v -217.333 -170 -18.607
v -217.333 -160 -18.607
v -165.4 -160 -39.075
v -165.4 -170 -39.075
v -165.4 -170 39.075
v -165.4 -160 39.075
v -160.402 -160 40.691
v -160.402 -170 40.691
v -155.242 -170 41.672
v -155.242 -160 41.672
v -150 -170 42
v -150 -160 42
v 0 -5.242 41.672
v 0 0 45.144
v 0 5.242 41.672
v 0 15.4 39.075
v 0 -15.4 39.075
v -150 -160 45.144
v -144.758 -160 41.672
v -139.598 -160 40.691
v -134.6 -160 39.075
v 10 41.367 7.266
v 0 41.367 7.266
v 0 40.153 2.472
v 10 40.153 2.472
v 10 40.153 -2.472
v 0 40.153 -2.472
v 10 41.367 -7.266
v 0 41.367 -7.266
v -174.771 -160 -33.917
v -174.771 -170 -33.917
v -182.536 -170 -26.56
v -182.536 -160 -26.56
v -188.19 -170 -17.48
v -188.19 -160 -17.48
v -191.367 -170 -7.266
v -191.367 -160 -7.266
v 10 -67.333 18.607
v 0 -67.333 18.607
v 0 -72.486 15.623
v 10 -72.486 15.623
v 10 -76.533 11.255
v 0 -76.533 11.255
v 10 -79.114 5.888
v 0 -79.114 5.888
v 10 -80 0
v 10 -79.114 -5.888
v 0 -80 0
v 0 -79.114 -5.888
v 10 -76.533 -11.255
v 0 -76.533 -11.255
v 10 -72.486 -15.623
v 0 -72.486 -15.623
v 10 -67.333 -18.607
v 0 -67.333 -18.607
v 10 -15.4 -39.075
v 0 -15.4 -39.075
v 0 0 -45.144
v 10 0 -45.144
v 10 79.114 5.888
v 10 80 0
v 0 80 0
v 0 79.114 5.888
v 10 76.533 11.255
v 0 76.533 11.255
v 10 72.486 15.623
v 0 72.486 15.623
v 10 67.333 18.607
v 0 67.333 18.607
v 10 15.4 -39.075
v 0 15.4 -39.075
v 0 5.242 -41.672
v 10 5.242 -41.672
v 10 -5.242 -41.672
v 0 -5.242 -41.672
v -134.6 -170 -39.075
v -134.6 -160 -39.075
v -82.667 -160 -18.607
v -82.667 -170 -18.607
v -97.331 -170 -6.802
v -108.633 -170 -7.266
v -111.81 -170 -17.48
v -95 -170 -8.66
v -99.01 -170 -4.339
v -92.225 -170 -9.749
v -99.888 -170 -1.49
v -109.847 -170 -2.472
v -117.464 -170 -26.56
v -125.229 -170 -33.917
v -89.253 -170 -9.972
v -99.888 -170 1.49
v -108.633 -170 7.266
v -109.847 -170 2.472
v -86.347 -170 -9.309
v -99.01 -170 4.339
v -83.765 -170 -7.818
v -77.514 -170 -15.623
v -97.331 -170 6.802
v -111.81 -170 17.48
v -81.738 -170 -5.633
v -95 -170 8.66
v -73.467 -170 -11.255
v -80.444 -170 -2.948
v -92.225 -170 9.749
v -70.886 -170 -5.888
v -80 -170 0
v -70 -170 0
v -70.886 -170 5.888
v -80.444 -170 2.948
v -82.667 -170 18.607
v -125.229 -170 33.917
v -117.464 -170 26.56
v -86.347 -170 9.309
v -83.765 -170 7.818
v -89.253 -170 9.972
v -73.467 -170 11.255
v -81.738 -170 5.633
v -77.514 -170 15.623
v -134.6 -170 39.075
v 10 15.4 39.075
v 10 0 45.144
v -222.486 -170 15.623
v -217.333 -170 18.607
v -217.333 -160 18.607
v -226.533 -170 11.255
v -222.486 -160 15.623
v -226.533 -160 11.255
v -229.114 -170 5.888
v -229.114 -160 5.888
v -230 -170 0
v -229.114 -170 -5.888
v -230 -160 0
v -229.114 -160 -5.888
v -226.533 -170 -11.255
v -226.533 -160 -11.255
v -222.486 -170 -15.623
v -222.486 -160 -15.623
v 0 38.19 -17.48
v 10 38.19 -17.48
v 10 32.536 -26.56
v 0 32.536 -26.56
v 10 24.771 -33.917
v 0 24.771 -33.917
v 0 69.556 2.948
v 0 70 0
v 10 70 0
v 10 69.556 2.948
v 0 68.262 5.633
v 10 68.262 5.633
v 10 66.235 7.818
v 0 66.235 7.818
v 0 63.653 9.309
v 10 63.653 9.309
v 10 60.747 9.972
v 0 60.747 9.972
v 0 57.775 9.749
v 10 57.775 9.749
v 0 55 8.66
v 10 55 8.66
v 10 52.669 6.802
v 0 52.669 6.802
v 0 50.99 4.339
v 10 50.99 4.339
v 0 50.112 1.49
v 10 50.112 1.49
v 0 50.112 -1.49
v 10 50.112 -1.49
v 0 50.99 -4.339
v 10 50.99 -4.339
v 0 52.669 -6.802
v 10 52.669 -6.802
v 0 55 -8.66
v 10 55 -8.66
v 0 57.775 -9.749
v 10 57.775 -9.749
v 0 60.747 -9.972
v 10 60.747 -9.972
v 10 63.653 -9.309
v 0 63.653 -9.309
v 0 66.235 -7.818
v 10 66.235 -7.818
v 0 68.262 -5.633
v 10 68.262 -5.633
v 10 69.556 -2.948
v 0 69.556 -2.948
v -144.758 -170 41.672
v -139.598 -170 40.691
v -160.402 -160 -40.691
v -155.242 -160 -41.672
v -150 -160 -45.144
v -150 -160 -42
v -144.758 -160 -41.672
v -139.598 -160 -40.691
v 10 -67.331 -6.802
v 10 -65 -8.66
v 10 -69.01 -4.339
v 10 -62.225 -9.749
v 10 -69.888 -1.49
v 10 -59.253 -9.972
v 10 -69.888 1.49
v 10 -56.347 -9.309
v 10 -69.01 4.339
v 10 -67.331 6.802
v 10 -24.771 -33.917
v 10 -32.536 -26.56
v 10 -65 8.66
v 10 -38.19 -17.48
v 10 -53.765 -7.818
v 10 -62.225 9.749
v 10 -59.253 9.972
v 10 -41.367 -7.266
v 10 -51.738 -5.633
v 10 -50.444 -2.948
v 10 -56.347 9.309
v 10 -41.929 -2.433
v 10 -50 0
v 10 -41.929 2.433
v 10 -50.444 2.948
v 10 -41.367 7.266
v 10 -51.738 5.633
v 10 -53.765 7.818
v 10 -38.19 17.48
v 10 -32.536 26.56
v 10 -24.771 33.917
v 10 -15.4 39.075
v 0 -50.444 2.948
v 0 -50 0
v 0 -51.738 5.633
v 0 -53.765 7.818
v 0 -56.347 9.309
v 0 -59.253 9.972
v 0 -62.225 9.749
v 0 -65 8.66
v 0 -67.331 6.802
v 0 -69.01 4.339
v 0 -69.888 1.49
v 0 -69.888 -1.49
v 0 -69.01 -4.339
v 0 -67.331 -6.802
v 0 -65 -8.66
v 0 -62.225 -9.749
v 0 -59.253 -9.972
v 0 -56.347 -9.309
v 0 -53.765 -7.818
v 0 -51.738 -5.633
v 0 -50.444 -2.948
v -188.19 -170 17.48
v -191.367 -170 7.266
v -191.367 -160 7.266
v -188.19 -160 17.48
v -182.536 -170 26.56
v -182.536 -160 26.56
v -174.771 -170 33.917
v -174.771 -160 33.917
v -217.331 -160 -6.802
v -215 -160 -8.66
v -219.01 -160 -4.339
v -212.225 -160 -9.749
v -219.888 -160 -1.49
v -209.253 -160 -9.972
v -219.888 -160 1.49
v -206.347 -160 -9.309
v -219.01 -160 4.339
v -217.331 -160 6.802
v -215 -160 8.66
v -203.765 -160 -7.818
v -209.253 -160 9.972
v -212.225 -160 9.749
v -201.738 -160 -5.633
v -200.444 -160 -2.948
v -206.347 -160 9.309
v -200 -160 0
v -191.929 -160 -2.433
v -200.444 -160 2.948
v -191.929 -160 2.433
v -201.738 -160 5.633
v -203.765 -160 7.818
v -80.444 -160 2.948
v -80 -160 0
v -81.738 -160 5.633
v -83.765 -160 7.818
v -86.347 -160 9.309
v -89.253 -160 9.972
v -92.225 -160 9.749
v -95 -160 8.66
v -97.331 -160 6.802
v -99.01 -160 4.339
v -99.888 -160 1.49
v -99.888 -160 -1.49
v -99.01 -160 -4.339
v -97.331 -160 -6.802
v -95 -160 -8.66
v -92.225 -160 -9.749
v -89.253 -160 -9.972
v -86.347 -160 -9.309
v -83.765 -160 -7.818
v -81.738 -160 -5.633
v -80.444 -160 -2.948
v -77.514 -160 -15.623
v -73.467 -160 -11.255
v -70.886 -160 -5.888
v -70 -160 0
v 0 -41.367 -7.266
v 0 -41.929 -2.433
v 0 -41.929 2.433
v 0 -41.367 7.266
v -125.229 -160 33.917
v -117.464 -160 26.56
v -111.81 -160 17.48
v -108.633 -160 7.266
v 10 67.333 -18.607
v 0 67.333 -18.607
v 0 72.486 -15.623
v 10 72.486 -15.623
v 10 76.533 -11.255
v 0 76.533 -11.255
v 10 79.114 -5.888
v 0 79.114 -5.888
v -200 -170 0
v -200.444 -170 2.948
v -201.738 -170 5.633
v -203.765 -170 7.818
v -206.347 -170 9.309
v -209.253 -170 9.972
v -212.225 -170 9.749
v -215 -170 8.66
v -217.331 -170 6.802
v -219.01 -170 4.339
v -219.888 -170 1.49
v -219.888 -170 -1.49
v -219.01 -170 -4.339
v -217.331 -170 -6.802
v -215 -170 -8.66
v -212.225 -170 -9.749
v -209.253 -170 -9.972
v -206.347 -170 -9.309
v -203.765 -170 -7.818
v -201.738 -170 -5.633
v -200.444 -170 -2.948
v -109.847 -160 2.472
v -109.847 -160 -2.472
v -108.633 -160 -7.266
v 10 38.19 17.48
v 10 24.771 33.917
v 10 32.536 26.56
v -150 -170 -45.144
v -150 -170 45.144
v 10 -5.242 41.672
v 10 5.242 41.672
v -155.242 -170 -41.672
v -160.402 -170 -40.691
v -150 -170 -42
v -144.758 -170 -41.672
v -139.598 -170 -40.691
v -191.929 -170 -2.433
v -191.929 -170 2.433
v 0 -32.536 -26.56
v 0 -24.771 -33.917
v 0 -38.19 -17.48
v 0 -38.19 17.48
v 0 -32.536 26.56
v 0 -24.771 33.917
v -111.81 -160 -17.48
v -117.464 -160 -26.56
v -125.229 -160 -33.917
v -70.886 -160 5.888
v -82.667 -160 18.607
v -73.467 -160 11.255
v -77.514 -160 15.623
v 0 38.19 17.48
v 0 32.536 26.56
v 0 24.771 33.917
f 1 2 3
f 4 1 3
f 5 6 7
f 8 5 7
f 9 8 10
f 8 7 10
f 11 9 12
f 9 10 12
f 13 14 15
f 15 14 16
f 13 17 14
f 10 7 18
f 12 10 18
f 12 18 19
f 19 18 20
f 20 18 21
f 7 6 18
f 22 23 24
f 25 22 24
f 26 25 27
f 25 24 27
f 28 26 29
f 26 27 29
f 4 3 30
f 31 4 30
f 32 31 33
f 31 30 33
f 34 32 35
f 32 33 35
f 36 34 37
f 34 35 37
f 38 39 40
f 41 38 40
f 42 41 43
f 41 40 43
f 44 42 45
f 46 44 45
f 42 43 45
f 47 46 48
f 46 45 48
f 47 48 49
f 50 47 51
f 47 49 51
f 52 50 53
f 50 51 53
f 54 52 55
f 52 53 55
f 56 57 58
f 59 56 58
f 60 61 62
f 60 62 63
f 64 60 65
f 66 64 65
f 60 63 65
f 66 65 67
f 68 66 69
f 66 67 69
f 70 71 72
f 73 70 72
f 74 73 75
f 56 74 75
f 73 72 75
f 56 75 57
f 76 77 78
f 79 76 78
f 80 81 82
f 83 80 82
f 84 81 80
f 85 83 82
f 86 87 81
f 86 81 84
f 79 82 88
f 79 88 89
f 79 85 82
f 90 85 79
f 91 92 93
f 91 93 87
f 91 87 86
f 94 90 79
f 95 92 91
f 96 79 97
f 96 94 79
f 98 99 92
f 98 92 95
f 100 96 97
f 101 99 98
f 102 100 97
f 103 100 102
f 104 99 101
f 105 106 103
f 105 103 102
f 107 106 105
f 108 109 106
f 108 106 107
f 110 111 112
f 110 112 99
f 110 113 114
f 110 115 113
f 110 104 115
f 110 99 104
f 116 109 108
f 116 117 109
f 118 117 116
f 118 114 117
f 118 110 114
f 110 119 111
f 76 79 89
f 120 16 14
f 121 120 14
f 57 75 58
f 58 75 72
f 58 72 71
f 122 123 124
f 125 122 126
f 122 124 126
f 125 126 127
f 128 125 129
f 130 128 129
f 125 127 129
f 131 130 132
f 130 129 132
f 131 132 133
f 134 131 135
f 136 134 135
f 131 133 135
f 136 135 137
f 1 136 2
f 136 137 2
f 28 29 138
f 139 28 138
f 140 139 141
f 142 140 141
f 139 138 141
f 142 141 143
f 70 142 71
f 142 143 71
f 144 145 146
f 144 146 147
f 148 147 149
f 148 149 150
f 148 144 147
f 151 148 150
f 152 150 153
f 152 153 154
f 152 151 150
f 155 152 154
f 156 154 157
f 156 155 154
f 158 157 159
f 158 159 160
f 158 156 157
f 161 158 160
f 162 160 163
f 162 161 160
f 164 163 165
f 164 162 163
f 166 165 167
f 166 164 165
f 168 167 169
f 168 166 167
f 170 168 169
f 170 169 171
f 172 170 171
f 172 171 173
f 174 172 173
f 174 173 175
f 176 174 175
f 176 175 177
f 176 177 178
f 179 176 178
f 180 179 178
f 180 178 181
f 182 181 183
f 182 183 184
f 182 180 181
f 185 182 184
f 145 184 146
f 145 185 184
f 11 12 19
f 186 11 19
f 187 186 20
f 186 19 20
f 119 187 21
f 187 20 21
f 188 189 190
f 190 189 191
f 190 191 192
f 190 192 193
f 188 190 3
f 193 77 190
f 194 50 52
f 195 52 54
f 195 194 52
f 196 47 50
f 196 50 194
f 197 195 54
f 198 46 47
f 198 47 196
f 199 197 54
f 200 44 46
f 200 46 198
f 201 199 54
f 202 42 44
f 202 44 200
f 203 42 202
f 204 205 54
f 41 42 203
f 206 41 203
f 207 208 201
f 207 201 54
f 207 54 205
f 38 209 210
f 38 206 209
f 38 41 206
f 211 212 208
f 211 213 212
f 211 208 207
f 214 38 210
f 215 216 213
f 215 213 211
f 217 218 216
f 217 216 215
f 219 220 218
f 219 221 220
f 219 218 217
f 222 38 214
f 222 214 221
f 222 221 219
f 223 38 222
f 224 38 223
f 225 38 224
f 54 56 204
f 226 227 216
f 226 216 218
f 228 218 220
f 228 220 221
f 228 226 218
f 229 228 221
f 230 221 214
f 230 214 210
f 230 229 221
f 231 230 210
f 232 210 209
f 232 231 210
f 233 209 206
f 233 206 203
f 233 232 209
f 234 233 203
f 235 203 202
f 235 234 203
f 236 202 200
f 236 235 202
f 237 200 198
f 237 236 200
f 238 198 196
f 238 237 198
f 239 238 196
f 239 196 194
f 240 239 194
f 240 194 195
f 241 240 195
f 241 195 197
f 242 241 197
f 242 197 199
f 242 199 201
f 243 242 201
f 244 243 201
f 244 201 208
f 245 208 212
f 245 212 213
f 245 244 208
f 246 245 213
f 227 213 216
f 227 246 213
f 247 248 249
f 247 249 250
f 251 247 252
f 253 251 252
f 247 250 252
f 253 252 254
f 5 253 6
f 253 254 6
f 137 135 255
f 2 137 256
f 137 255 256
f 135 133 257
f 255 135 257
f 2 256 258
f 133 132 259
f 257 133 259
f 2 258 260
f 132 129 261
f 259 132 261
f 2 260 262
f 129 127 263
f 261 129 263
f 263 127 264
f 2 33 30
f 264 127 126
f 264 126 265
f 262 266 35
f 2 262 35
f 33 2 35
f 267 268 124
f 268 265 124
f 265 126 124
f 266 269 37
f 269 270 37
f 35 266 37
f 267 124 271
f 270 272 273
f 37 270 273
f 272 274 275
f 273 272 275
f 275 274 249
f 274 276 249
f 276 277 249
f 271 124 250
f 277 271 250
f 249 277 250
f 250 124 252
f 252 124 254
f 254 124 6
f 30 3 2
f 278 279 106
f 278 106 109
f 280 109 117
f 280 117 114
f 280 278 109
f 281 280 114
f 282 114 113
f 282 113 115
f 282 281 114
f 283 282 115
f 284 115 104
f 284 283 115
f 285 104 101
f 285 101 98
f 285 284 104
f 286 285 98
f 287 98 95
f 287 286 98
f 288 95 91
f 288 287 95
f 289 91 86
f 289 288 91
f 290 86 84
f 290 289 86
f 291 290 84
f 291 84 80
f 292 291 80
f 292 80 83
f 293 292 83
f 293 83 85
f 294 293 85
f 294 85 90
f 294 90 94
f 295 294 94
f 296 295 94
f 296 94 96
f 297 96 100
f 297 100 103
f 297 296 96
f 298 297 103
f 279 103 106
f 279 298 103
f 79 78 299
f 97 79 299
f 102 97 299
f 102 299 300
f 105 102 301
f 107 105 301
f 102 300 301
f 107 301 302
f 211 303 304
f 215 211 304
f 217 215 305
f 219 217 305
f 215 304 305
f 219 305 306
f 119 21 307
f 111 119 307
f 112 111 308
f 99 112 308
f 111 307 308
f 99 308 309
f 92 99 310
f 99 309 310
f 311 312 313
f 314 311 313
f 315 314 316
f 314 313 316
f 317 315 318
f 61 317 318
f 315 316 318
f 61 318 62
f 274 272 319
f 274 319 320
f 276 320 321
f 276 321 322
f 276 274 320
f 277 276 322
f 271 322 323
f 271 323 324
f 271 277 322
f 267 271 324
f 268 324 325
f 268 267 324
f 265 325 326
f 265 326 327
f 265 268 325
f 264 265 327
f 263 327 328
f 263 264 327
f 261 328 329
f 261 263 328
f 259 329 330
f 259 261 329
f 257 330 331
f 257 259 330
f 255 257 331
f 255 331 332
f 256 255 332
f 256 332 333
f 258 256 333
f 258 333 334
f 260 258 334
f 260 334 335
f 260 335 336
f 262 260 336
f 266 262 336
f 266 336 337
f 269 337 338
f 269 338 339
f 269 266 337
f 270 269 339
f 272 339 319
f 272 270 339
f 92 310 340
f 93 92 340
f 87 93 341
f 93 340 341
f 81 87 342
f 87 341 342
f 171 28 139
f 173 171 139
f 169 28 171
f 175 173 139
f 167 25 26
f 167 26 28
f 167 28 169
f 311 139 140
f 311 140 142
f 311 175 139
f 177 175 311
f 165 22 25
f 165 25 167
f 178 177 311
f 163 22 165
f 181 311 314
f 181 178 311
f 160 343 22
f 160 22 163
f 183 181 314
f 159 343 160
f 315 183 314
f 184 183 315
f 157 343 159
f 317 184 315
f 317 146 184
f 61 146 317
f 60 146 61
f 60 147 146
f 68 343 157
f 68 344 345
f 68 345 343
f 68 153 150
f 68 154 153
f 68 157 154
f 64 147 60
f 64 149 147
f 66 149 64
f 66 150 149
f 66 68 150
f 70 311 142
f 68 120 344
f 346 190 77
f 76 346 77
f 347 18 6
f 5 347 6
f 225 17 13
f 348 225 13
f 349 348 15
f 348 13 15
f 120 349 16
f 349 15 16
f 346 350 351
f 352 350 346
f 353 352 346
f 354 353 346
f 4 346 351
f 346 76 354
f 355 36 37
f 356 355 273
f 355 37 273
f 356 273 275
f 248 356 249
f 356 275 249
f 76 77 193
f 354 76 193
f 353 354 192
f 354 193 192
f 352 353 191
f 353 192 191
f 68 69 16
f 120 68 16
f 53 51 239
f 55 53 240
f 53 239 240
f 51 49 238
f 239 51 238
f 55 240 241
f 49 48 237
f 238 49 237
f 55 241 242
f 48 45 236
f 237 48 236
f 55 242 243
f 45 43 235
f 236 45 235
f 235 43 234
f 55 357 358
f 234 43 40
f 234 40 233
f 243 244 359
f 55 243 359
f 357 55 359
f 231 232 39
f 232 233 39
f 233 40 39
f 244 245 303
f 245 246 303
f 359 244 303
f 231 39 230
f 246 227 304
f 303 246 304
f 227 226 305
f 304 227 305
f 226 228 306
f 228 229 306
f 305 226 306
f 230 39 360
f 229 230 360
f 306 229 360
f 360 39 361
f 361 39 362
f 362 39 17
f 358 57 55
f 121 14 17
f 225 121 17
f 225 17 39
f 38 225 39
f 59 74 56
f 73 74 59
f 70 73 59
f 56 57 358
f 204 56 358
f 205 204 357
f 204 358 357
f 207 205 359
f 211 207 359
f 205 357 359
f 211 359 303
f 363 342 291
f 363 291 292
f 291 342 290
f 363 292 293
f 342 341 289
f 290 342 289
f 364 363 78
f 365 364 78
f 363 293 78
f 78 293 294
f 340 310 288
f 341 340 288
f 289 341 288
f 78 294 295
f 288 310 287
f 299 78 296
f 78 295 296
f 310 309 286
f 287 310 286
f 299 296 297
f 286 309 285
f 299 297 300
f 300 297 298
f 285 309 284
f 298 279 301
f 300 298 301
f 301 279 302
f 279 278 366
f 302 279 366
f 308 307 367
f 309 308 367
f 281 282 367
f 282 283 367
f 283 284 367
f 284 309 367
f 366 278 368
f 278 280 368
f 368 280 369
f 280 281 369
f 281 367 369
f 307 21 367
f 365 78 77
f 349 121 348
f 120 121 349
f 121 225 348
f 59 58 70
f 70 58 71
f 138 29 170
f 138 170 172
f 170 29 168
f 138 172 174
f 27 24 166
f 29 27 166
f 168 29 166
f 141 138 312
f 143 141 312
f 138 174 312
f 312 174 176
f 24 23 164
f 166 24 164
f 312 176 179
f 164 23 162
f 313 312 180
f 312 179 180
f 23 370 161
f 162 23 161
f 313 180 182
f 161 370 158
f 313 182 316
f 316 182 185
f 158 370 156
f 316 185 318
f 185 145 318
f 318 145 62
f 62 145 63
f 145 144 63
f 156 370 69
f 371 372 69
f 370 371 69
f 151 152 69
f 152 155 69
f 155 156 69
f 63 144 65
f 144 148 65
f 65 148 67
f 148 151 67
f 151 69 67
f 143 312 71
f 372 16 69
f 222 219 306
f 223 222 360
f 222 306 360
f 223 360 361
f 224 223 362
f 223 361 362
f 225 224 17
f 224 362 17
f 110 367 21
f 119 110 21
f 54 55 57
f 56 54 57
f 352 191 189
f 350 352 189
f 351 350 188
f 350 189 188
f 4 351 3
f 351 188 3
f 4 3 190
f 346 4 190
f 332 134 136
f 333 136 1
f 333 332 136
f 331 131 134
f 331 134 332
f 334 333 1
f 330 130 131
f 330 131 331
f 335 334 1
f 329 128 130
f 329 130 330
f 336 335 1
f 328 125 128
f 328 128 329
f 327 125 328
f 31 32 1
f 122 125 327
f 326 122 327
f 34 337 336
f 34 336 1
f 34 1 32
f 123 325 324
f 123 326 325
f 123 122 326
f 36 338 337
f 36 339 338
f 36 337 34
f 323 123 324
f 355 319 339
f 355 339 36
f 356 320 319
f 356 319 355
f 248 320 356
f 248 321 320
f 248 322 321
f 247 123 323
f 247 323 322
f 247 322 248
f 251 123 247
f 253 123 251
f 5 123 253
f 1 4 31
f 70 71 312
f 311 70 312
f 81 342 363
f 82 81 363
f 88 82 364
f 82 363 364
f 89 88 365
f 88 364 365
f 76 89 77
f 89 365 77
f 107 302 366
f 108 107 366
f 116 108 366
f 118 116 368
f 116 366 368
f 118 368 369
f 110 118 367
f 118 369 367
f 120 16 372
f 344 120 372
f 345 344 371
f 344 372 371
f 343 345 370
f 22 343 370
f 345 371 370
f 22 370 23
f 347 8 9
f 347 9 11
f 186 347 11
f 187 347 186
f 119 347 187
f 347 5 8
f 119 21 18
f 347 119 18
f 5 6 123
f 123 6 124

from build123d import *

# Parameters (mm, degrees)
F3_R     = 10
F4_DEPTH = 10
F5_DEPTH = 10
F0_R     = 10


with BuildPart() as f4:
    # F3 (on offset) → F4 (new body)
    with BuildSketch(Plane.XZ.offset(160)):
        with BuildLine():
            ThreePointArc((-191.3666666667, 7.2662843936), (-182.5355038075, 26.5601391561), (-165.3999990784, 39.0748004267))
            Line((-165.3999990784, 39.0748004267), (-217.3333333333, 18.6070476493))
            ThreePointArc((-217.3333333333, 18.6070476493), (-201.9952684114, 18.3282370182), (-191.3666666667, 7.2662843936))
        make_face()
        with BuildLine():
            Line((-217.3333333333, -18.6070476493), (-165.4000014498, -39.0747994921))
            ThreePointArc((-165.4000014498, -39.0747994921), (-182.5355046135, -26.5601381688), (-191.3666666667, -7.2662843936))
            ThreePointArc((-191.3666666667, -7.2662843936), (-201.9952684114, -18.3282370182), (-217.3333333333, -18.6070476493))
        make_face()
        with BuildLine():
            ThreePointArc((-191.3666666667, -7.2662843936), (-192, 0), (-191.3666666667, 7.2662843936))
            ThreePointArc((-191.3666666667, 7.2662843936), (-201.9952684114, 18.3282370182), (-217.3333333333, 18.6070476493))
            ThreePointArc((-217.3333333333, 18.6070476493), (-230, 0), (-217.3333333333, -18.6070476493))
            ThreePointArc((-217.3333333333, -18.6070476493), (-201.9952684114, -18.3282370182), (-191.3666666667, -7.2662843936))
        make_face()
        with Locations((-210, 0)):
            Circle(F3_R, mode=Mode.SUBTRACT)
    extrude(amount=F4_DEPTH)


with BuildPart() as f4b:
    # F3 (on offset) → F4, piece 2 (new body)
    with BuildSketch(Plane.XZ.offset(160)):
        with BuildLine():
            Line((-82.6666666667, 18.6070476493), (-134.5999997898, 39.0747999806))
            ThreePointArc((-134.5999997898, 39.0747999806), (-117.4644958078, 26.5601386849), (-108.6333333333, 7.2662843936))
            ThreePointArc((-108.6333333333, 7.2662843936), (-98.0047315886, 18.3282370182), (-82.6666666667, 18.6070476493))
        make_face()
        with BuildLine():
            ThreePointArc((-108.6333333333, -7.2662843936), (-117.4644959547, -26.5601388649), (-134.6000002221, -39.074800151))
            Line((-134.6000002221, -39.074800151), (-82.6666666667, -18.6070476493))
            ThreePointArc((-82.6666666667, -18.6070476493), (-98.0047315886, -18.3282370182), (-108.6333333333, -7.2662843936))
        make_face()
        with BuildLine():
            ThreePointArc((-82.6666666667, 18.6070476493), (-98.0047315886, 18.3282370182), (-108.6333333333, 7.2662843936))
            ThreePointArc((-108.6333333333, 7.2662843936), (-108.1586329095, 3.6469165058), (-108, 0))
            ThreePointArc((-108, 0), (-108.1586329095, -3.6469165058), (-108.6333333333, -7.2662843936))
            ThreePointArc((-108.6333333333, -7.2662843936), (-98.0047315886, -18.3282370182), (-82.6666666667, -18.6070476493))
            ThreePointArc((-82.6666666667, -18.6070476493), (-73.4672043098, -11.2546286774), (-70, 0))
            ThreePointArc((-70, 0), (-73.4672043098, 11.2546286774), (-82.6666666667, 18.6070476493))
        make_face()
        with Locations((-90, 0)):
            Circle(F3_R, mode=Mode.SUBTRACT)
        with BuildLine():
            ThreePointArc((-108, 0), (-108.1586329095, 3.6469165058), (-108.6333333333, 7.2662843936))
            ThreePointArc((-108.6333333333, 7.2662843936), (-110, 0), (-108.6333333333, -7.2662843936))
            ThreePointArc((-108.6333333333, -7.2662843936), (-108.1586329095, -3.6469165058), (-108, 0))
        make_face()
    extrude(amount=F4_DEPTH)


with BuildPart() as f4c:
    # F3 (on offset) → F4, piece 3 (new body)
    with BuildSketch(Plane.XZ.offset(160)):
        with BuildLine():
            ThreePointArc((-165.3999990784, 39.0748004267), (-157.837677656, 41.2622201167), (-150, 42))
            Line((-150, 42), (-150, 45.1441849257))
            Line((-150, 45.1441849257), (-165.3999990784, 39.0748004267))
        make_face()
        with BuildLine():
            Line((-150, 45.1441849257), (-150, 42))
            ThreePointArc((-150, 42), (-142.1623217464, 41.2622200032), (-134.5999997898, 39.0747999806))
            Line((-134.5999997898, 39.0747999806), (-150, 45.1441849257))
        make_face()
    extrude(amount=F4_DEPTH)


with BuildPart() as f4d:
    # F3 (on offset) → F4, piece 4 (new body)
    with BuildSketch(Plane.XZ.offset(160)):
        with BuildLine():
            Line((-150, -45.1441849257), (-150, -42))
            ThreePointArc((-150, -42), (-157.8376789081, -41.2622198789), (-165.4000014498, -39.0747994921))
            Line((-165.4000014498, -39.0747994921), (-150, -45.1441849257))
        make_face()
        with BuildLine():
            ThreePointArc((-134.6000002221, -39.074800151), (-142.1623219746, -41.2622200466), (-150, -42))
            Line((-150, -42), (-150, -45.1441849257))
            Line((-150, -45.1441849257), (-134.6000002221, -39.074800151))
        make_face()
    extrude(amount=F4_DEPTH)


with BuildPart() as f5:
    # F0 (on Right) → F5 (new body)
    with BuildSketch(Plane.YZ):
        with BuildLine():
            ThreePointArc((-15.3999997771, 39.0748001513), (-3.545e-07, 42), (15.3999991174, 39.0748004113))
            Line((15.3999991174, 39.0748004113), (0, 45.1441849257))
            Line((0, 45.1441849257), (-15.3999997771, 39.0748001513))
        make_face()
    extrude(amount=F5_DEPTH)


with BuildPart() as f5b:
    # F0 (on Right) → F5, piece 2 (new body)
    with BuildSketch(Plane.YZ):
        with BuildLine():
            ThreePointArc((-41.3666666667, 7.2662843936), (-32.535504045, 26.5601388652), (-15.3999997771, 39.0748001513))
            Line((-15.3999997771, 39.0748001513), (-67.3333335684, 18.6070475566))
            ThreePointArc((-67.3333335684, 18.6070475566), (-51.9952685272, 18.3282370687), (-41.3666666667, 7.2662843936))
        make_face()
        with BuildLine():
            Line((-67.3333333845, -18.6070476291), (-15.4000000451, -39.0748000457))
            ThreePointArc((-15.4000000451, -39.0748000457), (-32.5355041361, -26.5601387536), (-41.3666666667, -7.2662843936))
            ThreePointArc((-41.3666666667, -7.2662843936), (-51.9952684366, -18.3282370292), (-67.3333333845, -18.6070476291))
        make_face()
        with BuildLine():
            ThreePointArc((-41.3666666667, -7.2662843936), (-42, 0), (-41.3666666667, 7.2662843936))
            ThreePointArc((-41.3666666667, 7.2662843936), (-51.9952685272, 18.3282370687), (-67.3333335684, 18.6070475566))
            ThreePointArc((-67.3333335684, 18.6070475566), (-80, -9.88e-08), (-67.3333333845, -18.6070476291))
            ThreePointArc((-67.3333333845, -18.6070476291), (-51.9952684366, -18.3282370292), (-41.3666666667, -7.2662843936))
        make_face()
        with Locations((-60, 0)):
            Circle(F0_R, mode=Mode.SUBTRACT)
    extrude(amount=F5_DEPTH)


with BuildPart() as f5c:
    # F0 (on Right) → F5, piece 3 (new body)
    with BuildSketch(Plane.YZ):
        with BuildLine():
            ThreePointArc((15.3999991174, 39.0748004113), (32.5355038208, 26.5601391399), (41.3666666667, 7.2662843936))
            ThreePointArc((41.3666666667, 7.2662843936), (51.9952686178, 18.3282371083), (67.3333337523, 18.6070474842))
            Line((67.3333337523, 18.6070474842), (15.3999991174, 39.0748004113))
        make_face()
        with BuildLine():
            ThreePointArc((41.3666666667, 7.2662843936), (41.8413670905, 3.6469165058), (42, 0))
            ThreePointArc((42, 0), (41.8413670905, -3.6469165058), (41.3666666667, -7.2662843936))
            ThreePointArc((41.3666666667, -7.2662843936), (51.9952685272, -18.3282370687), (67.3333335684, -18.6070475566))
            ThreePointArc((67.3333335684, -18.6070475566), (76.5327957613, -11.254628573), (80, 0))
            ThreePointArc((80, 0), (76.5327958169, 11.2546284913), (67.3333337523, 18.6070474842))
            ThreePointArc((67.3333337523, 18.6070474842), (51.9952686178, 18.3282371083), (41.3666666667, 7.2662843936))
        make_face()
        with Locations((60, 0)):
            Circle(F0_R, mode=Mode.SUBTRACT)
        with BuildLine():
            ThreePointArc((41.3666666667, -7.2662843936), (41.8413670905, -3.6469165058), (42, 0))
            ThreePointArc((42, 0), (41.8413670905, 3.6469165058), (41.3666666667, 7.2662843936))
            ThreePointArc((41.3666666667, 7.2662843936), (40, 0), (41.3666666667, -7.2662843936))
        make_face()
        with BuildLine():
            ThreePointArc((67.3333335684, -18.6070475566), (51.9952685272, -18.3282370687), (41.3666666667, -7.2662843936))
            ThreePointArc((41.3666666667, -7.2662843936), (32.535504191, -26.5601386863), (15.4000002067, -39.074799982))
            Line((15.4000002067, -39.074799982), (67.3333335684, -18.6070475566))
        make_face()
    extrude(amount=F5_DEPTH)


with BuildPart() as f5d:
    # F0 (on Right) → F5, piece 4 (new body)
    with BuildSketch(Plane.YZ):
        with BuildLine():
            Line((0, -45.1441849257), (15.4000002067, -39.074799982))
            ThreePointArc((15.4000002067, -39.074799982), (8.69e-08, -42), (-15.4000000451, -39.0748000457))
            Line((-15.4000000451, -39.0748000457), (0, -45.1441849257))
        make_face()
    extrude(amount=F5_DEPTH)


solid = Compound([f4.part, f4b.part, f4c.part, f4d.part, f5.part, f5b.part, f5c.part, f5d.part])
